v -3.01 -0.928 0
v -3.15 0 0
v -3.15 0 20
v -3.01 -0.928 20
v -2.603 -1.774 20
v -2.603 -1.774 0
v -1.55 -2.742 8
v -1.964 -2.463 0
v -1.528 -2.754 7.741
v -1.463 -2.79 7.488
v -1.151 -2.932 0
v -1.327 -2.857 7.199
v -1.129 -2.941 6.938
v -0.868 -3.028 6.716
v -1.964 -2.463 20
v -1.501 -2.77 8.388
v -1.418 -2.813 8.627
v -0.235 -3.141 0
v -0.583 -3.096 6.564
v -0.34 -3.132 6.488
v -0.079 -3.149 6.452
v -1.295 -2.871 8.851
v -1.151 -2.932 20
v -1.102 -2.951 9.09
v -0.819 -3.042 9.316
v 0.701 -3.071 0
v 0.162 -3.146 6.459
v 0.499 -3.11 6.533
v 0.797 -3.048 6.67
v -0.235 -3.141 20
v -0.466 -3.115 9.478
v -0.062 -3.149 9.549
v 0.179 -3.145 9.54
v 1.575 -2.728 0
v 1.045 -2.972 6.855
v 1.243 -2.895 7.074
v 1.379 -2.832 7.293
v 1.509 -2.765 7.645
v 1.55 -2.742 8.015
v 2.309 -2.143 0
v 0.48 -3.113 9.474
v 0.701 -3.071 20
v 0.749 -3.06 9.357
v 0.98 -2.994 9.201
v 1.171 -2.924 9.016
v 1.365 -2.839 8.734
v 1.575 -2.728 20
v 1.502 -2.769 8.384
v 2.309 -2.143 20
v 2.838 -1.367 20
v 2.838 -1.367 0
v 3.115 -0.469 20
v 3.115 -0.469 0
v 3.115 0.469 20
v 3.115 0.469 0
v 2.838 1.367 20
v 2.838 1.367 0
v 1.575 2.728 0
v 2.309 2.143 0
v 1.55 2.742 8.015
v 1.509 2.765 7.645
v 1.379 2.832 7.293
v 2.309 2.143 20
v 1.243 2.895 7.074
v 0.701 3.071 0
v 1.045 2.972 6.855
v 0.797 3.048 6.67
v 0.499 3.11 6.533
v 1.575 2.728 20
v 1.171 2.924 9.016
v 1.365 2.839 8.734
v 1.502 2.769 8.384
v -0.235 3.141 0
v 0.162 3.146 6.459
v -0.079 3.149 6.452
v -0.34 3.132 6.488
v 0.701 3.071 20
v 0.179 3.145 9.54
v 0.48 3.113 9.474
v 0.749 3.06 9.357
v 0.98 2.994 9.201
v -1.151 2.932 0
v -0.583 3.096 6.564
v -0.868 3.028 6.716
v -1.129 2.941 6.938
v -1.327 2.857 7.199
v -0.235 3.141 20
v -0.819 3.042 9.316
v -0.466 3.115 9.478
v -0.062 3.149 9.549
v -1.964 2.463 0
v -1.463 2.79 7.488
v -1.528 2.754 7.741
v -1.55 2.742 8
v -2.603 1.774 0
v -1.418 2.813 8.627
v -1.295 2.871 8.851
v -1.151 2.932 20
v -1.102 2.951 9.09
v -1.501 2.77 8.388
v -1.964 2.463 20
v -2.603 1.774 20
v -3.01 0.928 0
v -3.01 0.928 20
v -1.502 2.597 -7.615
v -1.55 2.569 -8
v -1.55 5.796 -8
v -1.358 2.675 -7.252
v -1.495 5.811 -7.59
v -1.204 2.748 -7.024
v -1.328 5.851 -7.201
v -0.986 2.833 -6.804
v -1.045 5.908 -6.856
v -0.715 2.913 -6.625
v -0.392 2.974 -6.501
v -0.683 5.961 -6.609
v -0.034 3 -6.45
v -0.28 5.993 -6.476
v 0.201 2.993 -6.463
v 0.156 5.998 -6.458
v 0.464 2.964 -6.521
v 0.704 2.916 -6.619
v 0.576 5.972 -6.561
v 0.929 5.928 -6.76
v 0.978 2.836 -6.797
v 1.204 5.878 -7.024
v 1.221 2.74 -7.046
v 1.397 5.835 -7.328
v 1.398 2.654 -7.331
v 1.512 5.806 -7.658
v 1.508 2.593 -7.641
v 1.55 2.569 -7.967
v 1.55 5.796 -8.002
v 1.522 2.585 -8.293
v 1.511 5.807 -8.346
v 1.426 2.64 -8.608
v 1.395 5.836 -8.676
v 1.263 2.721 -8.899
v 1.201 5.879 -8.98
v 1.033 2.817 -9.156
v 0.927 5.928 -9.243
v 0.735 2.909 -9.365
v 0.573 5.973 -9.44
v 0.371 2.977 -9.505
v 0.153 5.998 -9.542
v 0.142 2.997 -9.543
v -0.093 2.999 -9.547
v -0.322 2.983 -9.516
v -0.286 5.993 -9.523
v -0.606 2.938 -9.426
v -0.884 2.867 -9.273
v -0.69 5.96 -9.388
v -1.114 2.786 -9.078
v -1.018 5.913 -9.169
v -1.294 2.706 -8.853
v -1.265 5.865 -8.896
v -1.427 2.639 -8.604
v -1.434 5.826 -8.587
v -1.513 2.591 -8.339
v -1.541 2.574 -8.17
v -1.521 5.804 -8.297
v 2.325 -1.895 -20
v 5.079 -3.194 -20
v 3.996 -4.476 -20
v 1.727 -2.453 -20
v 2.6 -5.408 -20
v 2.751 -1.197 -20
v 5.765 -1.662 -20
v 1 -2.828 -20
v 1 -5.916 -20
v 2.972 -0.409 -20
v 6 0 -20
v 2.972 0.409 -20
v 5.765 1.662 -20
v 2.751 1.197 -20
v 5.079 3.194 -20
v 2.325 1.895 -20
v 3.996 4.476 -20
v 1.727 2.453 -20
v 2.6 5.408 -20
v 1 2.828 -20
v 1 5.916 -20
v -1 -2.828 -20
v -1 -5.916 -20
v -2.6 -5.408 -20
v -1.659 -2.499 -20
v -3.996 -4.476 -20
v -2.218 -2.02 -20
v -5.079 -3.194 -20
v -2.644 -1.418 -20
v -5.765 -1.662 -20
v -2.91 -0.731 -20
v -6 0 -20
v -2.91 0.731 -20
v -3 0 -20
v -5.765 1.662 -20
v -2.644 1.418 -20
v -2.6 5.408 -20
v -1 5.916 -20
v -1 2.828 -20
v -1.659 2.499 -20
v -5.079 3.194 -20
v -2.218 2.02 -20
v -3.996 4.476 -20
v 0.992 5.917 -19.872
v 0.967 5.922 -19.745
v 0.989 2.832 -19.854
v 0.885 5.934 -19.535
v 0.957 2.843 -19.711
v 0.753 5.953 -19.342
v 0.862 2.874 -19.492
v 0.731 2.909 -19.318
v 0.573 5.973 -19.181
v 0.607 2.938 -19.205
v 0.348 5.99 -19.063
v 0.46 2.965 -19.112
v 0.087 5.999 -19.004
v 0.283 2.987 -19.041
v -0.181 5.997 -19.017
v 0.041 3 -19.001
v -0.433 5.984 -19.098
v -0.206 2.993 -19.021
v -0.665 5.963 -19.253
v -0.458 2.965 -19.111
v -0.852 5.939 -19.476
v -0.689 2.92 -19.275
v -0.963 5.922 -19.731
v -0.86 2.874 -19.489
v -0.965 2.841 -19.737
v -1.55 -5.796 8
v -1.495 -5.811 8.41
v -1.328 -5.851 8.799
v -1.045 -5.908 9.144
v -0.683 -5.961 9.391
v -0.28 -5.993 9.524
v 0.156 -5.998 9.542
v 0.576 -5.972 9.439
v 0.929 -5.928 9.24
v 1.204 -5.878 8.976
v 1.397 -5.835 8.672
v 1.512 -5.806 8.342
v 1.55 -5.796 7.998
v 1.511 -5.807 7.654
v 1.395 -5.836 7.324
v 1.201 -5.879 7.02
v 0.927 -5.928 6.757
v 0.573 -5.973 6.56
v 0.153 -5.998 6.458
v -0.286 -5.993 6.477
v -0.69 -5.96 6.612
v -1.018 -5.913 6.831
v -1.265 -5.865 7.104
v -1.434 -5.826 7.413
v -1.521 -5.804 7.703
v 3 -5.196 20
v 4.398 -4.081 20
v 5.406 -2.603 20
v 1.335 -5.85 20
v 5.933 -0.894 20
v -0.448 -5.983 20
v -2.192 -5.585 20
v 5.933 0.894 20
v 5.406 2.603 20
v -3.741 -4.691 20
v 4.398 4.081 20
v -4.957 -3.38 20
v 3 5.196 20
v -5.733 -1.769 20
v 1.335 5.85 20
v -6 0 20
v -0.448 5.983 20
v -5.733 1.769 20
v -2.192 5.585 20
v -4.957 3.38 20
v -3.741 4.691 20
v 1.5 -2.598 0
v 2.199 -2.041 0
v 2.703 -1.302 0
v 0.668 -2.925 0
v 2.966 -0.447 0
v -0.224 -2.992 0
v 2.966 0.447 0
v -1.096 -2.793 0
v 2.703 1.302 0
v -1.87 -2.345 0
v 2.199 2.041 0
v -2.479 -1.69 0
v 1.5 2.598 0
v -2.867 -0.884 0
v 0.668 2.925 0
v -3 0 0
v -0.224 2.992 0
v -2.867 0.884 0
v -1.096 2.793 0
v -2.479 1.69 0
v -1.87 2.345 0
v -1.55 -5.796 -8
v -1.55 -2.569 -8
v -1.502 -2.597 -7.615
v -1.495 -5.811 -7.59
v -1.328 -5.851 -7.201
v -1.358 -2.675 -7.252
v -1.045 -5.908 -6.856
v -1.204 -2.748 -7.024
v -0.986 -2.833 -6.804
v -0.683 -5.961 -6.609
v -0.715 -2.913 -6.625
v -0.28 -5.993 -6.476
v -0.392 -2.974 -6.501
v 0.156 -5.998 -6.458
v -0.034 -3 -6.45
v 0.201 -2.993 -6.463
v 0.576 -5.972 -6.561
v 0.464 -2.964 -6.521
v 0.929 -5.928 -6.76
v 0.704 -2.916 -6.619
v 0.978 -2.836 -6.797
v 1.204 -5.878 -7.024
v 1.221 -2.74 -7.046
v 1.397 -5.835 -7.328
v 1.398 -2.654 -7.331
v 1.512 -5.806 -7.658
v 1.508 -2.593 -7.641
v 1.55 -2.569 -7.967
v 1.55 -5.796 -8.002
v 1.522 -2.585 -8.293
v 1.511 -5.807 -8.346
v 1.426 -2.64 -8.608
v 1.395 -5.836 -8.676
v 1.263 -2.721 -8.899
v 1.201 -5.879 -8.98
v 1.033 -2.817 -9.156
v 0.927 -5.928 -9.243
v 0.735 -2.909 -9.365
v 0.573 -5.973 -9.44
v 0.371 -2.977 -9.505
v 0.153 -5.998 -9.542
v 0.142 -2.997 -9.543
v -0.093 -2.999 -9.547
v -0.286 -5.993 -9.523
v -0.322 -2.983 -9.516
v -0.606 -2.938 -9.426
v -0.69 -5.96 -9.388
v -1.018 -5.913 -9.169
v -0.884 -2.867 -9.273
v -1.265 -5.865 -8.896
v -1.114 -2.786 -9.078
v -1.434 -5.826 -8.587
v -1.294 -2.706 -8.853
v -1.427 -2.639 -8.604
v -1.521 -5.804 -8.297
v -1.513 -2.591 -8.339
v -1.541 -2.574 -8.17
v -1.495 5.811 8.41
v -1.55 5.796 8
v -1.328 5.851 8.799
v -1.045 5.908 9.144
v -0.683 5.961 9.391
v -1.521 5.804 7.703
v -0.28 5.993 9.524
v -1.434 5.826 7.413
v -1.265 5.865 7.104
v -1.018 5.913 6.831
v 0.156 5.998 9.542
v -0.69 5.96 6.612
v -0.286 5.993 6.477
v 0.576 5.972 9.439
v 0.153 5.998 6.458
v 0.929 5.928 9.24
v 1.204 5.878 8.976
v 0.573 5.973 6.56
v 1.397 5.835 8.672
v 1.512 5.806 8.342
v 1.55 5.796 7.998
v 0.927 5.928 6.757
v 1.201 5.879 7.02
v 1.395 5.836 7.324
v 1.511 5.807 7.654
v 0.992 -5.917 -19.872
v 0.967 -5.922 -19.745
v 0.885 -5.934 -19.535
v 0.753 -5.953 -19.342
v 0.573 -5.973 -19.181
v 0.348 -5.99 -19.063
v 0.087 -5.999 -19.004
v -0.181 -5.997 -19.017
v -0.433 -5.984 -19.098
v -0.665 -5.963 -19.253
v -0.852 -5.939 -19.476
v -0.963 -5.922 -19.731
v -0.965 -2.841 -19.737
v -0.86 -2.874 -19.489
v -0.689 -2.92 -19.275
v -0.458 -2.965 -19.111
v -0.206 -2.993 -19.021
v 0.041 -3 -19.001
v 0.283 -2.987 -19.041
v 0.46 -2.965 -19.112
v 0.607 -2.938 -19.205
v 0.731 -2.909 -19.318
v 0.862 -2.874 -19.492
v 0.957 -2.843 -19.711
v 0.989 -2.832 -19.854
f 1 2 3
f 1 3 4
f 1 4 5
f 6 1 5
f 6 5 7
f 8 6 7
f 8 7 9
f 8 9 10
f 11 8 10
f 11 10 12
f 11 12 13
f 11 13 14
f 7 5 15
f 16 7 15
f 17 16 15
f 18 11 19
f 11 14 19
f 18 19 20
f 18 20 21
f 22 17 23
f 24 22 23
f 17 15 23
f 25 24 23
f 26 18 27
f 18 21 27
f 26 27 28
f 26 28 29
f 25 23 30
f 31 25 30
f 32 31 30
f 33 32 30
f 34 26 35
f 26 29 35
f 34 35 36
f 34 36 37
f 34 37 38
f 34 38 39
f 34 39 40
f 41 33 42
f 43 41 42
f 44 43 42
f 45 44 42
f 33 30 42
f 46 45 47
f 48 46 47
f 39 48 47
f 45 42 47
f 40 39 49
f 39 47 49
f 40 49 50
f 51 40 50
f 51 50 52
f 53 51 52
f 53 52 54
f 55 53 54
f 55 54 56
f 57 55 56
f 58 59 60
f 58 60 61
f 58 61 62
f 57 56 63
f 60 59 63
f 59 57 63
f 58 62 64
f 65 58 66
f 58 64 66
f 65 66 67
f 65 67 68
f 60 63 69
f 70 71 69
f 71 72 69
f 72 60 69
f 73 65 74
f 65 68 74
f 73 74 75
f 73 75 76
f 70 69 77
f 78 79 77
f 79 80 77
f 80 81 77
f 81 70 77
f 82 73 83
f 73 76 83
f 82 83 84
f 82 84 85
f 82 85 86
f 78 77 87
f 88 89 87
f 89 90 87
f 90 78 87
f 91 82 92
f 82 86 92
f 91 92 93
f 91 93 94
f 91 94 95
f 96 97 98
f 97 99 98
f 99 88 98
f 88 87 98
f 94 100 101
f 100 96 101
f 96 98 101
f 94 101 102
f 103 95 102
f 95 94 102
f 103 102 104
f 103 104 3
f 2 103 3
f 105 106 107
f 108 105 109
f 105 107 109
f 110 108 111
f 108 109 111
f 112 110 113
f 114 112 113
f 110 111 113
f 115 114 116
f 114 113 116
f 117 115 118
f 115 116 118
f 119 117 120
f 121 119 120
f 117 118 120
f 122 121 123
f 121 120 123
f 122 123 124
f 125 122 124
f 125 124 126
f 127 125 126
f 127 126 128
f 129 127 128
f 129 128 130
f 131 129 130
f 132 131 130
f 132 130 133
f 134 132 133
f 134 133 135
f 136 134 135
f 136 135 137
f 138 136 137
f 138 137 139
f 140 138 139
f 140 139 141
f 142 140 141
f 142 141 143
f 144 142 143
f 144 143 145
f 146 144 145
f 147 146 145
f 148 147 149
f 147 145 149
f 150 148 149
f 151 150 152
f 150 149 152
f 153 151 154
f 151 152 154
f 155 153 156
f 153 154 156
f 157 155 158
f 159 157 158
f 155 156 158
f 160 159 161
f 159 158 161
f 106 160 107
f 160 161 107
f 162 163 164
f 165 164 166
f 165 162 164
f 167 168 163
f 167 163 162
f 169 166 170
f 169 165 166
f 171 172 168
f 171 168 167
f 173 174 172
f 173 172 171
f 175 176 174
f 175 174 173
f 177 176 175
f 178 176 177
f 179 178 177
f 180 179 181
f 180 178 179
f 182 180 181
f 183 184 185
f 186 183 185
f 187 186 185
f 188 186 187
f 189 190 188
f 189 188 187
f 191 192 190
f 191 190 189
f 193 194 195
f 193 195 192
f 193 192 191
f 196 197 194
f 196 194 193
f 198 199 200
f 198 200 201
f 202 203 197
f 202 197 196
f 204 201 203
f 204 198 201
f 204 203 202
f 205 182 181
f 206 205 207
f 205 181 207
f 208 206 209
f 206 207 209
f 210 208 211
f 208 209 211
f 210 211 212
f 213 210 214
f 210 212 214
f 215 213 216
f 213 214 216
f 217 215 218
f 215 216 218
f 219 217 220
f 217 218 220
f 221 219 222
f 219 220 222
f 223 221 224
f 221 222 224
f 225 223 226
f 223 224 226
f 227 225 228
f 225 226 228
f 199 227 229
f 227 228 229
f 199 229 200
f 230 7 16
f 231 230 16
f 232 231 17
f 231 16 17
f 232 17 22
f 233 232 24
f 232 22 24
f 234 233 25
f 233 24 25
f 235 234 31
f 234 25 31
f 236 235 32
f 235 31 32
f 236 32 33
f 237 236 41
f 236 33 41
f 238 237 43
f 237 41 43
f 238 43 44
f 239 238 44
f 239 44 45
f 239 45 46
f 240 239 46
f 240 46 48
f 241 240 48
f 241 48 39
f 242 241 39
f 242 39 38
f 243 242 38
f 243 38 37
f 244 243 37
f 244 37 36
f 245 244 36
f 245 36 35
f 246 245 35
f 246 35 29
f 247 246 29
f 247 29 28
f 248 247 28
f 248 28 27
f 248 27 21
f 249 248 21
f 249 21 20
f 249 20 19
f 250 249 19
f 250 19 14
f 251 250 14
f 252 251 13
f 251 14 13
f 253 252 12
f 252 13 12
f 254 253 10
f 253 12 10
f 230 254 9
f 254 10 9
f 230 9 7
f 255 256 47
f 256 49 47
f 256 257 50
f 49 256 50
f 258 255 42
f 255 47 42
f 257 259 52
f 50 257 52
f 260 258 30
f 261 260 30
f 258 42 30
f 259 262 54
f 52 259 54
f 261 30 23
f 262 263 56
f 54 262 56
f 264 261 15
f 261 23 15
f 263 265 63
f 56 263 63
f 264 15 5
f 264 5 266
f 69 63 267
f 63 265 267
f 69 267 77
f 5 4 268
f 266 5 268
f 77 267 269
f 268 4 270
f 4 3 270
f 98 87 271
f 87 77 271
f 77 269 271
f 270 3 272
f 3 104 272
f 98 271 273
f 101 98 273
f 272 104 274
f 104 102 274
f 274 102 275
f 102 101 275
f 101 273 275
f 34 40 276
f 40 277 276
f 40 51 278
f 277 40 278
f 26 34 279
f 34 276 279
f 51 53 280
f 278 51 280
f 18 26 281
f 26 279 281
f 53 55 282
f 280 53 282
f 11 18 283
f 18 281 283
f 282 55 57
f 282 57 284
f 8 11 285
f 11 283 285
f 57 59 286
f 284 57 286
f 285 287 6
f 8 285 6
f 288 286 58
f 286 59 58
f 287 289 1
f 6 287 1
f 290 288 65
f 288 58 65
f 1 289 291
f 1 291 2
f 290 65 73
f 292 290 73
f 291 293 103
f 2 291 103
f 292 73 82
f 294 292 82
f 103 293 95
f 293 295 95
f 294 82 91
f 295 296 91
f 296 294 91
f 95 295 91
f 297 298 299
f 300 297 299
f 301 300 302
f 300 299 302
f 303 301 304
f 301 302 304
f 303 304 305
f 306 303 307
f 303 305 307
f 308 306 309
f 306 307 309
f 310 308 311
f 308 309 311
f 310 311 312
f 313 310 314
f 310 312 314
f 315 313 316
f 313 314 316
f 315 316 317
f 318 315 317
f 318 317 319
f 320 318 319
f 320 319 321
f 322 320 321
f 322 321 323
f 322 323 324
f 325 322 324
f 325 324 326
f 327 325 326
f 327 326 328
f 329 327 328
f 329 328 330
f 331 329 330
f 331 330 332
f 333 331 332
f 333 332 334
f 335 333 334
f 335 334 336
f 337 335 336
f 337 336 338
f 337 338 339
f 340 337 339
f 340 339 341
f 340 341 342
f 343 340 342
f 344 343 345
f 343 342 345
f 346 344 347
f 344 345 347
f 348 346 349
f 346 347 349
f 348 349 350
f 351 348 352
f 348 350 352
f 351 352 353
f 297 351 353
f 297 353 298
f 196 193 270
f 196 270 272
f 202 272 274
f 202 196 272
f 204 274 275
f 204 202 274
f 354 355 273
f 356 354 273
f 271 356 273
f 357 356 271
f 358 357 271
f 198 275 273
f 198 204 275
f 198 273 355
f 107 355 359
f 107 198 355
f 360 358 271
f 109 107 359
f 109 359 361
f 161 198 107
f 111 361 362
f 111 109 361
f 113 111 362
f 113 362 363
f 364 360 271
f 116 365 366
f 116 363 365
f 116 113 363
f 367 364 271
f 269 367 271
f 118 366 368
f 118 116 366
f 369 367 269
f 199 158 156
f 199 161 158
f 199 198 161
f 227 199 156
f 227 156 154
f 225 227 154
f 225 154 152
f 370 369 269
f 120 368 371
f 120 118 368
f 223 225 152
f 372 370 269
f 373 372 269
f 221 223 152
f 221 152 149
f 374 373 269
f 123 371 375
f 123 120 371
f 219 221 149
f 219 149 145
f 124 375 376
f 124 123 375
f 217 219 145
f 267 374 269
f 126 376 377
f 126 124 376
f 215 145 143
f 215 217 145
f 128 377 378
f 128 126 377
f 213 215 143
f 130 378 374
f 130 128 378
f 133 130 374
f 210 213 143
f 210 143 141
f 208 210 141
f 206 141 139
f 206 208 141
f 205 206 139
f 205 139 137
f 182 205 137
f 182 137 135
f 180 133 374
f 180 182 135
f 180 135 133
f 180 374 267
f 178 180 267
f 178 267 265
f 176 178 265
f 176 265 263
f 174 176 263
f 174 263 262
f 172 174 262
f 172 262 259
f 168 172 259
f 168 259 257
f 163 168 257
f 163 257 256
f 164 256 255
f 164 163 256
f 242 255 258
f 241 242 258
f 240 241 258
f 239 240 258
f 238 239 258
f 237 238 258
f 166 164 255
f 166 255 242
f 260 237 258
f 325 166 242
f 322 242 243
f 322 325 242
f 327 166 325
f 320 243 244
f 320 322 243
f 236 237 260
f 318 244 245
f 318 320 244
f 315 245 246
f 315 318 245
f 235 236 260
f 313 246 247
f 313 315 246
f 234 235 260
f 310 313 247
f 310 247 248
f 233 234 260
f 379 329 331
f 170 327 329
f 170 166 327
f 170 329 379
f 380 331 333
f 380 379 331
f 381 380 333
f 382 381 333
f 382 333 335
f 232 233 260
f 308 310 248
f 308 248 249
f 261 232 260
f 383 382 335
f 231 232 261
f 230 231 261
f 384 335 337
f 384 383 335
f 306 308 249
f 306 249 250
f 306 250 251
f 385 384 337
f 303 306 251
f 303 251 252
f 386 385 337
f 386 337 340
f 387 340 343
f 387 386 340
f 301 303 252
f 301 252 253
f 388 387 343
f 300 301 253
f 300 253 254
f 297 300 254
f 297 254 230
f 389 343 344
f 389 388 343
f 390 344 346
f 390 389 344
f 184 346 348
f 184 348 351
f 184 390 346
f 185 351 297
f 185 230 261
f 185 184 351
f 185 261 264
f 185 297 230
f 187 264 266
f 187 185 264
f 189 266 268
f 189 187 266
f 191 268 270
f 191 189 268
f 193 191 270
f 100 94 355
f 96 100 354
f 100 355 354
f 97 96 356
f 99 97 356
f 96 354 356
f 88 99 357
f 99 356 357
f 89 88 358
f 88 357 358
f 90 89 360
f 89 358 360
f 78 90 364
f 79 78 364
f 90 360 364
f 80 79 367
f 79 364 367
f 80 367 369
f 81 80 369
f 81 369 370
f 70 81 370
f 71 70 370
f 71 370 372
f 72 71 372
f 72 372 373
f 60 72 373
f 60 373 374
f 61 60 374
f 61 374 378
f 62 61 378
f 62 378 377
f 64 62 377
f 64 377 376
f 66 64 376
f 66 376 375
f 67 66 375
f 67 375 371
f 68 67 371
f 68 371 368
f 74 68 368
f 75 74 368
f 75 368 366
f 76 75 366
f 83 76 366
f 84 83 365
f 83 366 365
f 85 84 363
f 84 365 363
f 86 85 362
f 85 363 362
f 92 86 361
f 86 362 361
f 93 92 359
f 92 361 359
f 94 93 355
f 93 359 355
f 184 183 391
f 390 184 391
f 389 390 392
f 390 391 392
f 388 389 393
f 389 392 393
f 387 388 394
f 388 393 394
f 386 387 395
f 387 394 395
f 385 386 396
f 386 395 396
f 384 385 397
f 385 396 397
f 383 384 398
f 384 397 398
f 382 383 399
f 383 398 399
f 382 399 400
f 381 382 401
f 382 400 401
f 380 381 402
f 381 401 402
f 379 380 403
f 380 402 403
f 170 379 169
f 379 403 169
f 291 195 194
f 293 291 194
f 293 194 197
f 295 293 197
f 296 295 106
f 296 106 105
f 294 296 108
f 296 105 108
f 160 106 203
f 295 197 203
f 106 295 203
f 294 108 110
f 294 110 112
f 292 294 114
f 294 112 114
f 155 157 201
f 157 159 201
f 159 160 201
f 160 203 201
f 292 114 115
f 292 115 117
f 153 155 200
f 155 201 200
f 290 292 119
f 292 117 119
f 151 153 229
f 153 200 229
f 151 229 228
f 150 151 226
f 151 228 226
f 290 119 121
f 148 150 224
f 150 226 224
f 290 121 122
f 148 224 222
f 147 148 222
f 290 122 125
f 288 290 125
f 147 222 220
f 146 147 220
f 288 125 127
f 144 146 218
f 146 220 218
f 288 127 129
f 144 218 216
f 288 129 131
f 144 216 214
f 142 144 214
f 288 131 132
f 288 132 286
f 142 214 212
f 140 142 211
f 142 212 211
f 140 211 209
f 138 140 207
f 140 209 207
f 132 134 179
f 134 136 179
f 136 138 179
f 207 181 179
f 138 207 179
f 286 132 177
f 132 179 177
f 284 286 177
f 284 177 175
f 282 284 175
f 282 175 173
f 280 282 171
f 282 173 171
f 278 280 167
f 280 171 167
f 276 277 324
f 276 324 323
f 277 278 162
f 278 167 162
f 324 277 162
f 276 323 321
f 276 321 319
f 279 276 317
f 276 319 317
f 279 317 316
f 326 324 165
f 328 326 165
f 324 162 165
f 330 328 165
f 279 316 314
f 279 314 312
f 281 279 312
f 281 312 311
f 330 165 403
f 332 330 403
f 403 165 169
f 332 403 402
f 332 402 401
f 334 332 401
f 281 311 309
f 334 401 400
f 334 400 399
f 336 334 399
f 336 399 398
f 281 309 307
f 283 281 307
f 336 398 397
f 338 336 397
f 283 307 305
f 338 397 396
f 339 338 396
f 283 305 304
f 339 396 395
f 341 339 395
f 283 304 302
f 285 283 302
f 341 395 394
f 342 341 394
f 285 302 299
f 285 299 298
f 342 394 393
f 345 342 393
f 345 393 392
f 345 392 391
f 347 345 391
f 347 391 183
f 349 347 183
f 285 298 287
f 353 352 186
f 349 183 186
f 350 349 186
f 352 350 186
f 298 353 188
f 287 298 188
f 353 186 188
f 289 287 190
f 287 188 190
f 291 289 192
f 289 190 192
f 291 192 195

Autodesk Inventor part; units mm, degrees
ref_plane "YZ Plane" through (0, 0, 0) normal (1, 0, 0) x (0, 1, 0)
ref_plane "XZ Plane" through (0, 0, 0) normal (0, 1, 0) x (-1, 0, 0)
ref_plane "XY Plane" through (0, 0, 0) normal (0, 0, 1) x (1, 0, 0)
sketch "Sketch1" plane through (0, 0, 0) normal (0, 1, 0) x (-1, 0, 0)
  line L0 (0, 0) -> (3, 0)
  line L1 (3, 0) -> (3, -20)
  line L2 (3, -20) -> (0, -20)
  line L3 (0, -20) -> (0, 0)
  line L4 (0, 0) -> (0, -8)
  circle A0 centre (0, -8) radius 1.55
  line L5 (3, 0) -> (6, 0)
  line L6 (6, 0) -> (6, -20)
  line L7 (6, -20) -> (3, -20)
  line L8 (0, 0) -> (3.15, 0)
  line L9 (3.15, 0) -> (3.15, 20)
  line L10 (3.15, 20) -> (0, 20)
  line L11 (0, 20) -> (0, 0)
  line L12 (0, 0) -> (0, 8)
  circle A1 centre (0, 8) radius 1.55
  line L13 (3.15, 20) -> (6, 20)
  line L14 (6, 20) -> (6, 0)
  circle A2 centre (0, -20) radius 1
  dimension "d0" = 3
  dimension "d1" = 20
  dimension "d2" = 3
  dimension "d3" = 8
  dimension "d4" = 3.1
  dimension "d5" = 3
  dimension "d6" = 3.15
  dimension "d7" = 20
  dimension "d8" = 8
  dimension "d9" = 3.1
  dimension "d11" = 2
revolve "Revolution1" add sketch "Sketch1" angle 360 about axis through (0, 0, 20) along (0, 0, -1) contours L5 L6 L7 L1 | L9 L13 L14 L5
extrude "Extrusion1" cut sketch "Sketch1" along normal mid plane 20 contours A0 L3 | L3 A0 | A1 L11 | L11 A1 | A2 L3 L2 | L2 L3 A2
properties part number "shaft_to_dc_coupler"
